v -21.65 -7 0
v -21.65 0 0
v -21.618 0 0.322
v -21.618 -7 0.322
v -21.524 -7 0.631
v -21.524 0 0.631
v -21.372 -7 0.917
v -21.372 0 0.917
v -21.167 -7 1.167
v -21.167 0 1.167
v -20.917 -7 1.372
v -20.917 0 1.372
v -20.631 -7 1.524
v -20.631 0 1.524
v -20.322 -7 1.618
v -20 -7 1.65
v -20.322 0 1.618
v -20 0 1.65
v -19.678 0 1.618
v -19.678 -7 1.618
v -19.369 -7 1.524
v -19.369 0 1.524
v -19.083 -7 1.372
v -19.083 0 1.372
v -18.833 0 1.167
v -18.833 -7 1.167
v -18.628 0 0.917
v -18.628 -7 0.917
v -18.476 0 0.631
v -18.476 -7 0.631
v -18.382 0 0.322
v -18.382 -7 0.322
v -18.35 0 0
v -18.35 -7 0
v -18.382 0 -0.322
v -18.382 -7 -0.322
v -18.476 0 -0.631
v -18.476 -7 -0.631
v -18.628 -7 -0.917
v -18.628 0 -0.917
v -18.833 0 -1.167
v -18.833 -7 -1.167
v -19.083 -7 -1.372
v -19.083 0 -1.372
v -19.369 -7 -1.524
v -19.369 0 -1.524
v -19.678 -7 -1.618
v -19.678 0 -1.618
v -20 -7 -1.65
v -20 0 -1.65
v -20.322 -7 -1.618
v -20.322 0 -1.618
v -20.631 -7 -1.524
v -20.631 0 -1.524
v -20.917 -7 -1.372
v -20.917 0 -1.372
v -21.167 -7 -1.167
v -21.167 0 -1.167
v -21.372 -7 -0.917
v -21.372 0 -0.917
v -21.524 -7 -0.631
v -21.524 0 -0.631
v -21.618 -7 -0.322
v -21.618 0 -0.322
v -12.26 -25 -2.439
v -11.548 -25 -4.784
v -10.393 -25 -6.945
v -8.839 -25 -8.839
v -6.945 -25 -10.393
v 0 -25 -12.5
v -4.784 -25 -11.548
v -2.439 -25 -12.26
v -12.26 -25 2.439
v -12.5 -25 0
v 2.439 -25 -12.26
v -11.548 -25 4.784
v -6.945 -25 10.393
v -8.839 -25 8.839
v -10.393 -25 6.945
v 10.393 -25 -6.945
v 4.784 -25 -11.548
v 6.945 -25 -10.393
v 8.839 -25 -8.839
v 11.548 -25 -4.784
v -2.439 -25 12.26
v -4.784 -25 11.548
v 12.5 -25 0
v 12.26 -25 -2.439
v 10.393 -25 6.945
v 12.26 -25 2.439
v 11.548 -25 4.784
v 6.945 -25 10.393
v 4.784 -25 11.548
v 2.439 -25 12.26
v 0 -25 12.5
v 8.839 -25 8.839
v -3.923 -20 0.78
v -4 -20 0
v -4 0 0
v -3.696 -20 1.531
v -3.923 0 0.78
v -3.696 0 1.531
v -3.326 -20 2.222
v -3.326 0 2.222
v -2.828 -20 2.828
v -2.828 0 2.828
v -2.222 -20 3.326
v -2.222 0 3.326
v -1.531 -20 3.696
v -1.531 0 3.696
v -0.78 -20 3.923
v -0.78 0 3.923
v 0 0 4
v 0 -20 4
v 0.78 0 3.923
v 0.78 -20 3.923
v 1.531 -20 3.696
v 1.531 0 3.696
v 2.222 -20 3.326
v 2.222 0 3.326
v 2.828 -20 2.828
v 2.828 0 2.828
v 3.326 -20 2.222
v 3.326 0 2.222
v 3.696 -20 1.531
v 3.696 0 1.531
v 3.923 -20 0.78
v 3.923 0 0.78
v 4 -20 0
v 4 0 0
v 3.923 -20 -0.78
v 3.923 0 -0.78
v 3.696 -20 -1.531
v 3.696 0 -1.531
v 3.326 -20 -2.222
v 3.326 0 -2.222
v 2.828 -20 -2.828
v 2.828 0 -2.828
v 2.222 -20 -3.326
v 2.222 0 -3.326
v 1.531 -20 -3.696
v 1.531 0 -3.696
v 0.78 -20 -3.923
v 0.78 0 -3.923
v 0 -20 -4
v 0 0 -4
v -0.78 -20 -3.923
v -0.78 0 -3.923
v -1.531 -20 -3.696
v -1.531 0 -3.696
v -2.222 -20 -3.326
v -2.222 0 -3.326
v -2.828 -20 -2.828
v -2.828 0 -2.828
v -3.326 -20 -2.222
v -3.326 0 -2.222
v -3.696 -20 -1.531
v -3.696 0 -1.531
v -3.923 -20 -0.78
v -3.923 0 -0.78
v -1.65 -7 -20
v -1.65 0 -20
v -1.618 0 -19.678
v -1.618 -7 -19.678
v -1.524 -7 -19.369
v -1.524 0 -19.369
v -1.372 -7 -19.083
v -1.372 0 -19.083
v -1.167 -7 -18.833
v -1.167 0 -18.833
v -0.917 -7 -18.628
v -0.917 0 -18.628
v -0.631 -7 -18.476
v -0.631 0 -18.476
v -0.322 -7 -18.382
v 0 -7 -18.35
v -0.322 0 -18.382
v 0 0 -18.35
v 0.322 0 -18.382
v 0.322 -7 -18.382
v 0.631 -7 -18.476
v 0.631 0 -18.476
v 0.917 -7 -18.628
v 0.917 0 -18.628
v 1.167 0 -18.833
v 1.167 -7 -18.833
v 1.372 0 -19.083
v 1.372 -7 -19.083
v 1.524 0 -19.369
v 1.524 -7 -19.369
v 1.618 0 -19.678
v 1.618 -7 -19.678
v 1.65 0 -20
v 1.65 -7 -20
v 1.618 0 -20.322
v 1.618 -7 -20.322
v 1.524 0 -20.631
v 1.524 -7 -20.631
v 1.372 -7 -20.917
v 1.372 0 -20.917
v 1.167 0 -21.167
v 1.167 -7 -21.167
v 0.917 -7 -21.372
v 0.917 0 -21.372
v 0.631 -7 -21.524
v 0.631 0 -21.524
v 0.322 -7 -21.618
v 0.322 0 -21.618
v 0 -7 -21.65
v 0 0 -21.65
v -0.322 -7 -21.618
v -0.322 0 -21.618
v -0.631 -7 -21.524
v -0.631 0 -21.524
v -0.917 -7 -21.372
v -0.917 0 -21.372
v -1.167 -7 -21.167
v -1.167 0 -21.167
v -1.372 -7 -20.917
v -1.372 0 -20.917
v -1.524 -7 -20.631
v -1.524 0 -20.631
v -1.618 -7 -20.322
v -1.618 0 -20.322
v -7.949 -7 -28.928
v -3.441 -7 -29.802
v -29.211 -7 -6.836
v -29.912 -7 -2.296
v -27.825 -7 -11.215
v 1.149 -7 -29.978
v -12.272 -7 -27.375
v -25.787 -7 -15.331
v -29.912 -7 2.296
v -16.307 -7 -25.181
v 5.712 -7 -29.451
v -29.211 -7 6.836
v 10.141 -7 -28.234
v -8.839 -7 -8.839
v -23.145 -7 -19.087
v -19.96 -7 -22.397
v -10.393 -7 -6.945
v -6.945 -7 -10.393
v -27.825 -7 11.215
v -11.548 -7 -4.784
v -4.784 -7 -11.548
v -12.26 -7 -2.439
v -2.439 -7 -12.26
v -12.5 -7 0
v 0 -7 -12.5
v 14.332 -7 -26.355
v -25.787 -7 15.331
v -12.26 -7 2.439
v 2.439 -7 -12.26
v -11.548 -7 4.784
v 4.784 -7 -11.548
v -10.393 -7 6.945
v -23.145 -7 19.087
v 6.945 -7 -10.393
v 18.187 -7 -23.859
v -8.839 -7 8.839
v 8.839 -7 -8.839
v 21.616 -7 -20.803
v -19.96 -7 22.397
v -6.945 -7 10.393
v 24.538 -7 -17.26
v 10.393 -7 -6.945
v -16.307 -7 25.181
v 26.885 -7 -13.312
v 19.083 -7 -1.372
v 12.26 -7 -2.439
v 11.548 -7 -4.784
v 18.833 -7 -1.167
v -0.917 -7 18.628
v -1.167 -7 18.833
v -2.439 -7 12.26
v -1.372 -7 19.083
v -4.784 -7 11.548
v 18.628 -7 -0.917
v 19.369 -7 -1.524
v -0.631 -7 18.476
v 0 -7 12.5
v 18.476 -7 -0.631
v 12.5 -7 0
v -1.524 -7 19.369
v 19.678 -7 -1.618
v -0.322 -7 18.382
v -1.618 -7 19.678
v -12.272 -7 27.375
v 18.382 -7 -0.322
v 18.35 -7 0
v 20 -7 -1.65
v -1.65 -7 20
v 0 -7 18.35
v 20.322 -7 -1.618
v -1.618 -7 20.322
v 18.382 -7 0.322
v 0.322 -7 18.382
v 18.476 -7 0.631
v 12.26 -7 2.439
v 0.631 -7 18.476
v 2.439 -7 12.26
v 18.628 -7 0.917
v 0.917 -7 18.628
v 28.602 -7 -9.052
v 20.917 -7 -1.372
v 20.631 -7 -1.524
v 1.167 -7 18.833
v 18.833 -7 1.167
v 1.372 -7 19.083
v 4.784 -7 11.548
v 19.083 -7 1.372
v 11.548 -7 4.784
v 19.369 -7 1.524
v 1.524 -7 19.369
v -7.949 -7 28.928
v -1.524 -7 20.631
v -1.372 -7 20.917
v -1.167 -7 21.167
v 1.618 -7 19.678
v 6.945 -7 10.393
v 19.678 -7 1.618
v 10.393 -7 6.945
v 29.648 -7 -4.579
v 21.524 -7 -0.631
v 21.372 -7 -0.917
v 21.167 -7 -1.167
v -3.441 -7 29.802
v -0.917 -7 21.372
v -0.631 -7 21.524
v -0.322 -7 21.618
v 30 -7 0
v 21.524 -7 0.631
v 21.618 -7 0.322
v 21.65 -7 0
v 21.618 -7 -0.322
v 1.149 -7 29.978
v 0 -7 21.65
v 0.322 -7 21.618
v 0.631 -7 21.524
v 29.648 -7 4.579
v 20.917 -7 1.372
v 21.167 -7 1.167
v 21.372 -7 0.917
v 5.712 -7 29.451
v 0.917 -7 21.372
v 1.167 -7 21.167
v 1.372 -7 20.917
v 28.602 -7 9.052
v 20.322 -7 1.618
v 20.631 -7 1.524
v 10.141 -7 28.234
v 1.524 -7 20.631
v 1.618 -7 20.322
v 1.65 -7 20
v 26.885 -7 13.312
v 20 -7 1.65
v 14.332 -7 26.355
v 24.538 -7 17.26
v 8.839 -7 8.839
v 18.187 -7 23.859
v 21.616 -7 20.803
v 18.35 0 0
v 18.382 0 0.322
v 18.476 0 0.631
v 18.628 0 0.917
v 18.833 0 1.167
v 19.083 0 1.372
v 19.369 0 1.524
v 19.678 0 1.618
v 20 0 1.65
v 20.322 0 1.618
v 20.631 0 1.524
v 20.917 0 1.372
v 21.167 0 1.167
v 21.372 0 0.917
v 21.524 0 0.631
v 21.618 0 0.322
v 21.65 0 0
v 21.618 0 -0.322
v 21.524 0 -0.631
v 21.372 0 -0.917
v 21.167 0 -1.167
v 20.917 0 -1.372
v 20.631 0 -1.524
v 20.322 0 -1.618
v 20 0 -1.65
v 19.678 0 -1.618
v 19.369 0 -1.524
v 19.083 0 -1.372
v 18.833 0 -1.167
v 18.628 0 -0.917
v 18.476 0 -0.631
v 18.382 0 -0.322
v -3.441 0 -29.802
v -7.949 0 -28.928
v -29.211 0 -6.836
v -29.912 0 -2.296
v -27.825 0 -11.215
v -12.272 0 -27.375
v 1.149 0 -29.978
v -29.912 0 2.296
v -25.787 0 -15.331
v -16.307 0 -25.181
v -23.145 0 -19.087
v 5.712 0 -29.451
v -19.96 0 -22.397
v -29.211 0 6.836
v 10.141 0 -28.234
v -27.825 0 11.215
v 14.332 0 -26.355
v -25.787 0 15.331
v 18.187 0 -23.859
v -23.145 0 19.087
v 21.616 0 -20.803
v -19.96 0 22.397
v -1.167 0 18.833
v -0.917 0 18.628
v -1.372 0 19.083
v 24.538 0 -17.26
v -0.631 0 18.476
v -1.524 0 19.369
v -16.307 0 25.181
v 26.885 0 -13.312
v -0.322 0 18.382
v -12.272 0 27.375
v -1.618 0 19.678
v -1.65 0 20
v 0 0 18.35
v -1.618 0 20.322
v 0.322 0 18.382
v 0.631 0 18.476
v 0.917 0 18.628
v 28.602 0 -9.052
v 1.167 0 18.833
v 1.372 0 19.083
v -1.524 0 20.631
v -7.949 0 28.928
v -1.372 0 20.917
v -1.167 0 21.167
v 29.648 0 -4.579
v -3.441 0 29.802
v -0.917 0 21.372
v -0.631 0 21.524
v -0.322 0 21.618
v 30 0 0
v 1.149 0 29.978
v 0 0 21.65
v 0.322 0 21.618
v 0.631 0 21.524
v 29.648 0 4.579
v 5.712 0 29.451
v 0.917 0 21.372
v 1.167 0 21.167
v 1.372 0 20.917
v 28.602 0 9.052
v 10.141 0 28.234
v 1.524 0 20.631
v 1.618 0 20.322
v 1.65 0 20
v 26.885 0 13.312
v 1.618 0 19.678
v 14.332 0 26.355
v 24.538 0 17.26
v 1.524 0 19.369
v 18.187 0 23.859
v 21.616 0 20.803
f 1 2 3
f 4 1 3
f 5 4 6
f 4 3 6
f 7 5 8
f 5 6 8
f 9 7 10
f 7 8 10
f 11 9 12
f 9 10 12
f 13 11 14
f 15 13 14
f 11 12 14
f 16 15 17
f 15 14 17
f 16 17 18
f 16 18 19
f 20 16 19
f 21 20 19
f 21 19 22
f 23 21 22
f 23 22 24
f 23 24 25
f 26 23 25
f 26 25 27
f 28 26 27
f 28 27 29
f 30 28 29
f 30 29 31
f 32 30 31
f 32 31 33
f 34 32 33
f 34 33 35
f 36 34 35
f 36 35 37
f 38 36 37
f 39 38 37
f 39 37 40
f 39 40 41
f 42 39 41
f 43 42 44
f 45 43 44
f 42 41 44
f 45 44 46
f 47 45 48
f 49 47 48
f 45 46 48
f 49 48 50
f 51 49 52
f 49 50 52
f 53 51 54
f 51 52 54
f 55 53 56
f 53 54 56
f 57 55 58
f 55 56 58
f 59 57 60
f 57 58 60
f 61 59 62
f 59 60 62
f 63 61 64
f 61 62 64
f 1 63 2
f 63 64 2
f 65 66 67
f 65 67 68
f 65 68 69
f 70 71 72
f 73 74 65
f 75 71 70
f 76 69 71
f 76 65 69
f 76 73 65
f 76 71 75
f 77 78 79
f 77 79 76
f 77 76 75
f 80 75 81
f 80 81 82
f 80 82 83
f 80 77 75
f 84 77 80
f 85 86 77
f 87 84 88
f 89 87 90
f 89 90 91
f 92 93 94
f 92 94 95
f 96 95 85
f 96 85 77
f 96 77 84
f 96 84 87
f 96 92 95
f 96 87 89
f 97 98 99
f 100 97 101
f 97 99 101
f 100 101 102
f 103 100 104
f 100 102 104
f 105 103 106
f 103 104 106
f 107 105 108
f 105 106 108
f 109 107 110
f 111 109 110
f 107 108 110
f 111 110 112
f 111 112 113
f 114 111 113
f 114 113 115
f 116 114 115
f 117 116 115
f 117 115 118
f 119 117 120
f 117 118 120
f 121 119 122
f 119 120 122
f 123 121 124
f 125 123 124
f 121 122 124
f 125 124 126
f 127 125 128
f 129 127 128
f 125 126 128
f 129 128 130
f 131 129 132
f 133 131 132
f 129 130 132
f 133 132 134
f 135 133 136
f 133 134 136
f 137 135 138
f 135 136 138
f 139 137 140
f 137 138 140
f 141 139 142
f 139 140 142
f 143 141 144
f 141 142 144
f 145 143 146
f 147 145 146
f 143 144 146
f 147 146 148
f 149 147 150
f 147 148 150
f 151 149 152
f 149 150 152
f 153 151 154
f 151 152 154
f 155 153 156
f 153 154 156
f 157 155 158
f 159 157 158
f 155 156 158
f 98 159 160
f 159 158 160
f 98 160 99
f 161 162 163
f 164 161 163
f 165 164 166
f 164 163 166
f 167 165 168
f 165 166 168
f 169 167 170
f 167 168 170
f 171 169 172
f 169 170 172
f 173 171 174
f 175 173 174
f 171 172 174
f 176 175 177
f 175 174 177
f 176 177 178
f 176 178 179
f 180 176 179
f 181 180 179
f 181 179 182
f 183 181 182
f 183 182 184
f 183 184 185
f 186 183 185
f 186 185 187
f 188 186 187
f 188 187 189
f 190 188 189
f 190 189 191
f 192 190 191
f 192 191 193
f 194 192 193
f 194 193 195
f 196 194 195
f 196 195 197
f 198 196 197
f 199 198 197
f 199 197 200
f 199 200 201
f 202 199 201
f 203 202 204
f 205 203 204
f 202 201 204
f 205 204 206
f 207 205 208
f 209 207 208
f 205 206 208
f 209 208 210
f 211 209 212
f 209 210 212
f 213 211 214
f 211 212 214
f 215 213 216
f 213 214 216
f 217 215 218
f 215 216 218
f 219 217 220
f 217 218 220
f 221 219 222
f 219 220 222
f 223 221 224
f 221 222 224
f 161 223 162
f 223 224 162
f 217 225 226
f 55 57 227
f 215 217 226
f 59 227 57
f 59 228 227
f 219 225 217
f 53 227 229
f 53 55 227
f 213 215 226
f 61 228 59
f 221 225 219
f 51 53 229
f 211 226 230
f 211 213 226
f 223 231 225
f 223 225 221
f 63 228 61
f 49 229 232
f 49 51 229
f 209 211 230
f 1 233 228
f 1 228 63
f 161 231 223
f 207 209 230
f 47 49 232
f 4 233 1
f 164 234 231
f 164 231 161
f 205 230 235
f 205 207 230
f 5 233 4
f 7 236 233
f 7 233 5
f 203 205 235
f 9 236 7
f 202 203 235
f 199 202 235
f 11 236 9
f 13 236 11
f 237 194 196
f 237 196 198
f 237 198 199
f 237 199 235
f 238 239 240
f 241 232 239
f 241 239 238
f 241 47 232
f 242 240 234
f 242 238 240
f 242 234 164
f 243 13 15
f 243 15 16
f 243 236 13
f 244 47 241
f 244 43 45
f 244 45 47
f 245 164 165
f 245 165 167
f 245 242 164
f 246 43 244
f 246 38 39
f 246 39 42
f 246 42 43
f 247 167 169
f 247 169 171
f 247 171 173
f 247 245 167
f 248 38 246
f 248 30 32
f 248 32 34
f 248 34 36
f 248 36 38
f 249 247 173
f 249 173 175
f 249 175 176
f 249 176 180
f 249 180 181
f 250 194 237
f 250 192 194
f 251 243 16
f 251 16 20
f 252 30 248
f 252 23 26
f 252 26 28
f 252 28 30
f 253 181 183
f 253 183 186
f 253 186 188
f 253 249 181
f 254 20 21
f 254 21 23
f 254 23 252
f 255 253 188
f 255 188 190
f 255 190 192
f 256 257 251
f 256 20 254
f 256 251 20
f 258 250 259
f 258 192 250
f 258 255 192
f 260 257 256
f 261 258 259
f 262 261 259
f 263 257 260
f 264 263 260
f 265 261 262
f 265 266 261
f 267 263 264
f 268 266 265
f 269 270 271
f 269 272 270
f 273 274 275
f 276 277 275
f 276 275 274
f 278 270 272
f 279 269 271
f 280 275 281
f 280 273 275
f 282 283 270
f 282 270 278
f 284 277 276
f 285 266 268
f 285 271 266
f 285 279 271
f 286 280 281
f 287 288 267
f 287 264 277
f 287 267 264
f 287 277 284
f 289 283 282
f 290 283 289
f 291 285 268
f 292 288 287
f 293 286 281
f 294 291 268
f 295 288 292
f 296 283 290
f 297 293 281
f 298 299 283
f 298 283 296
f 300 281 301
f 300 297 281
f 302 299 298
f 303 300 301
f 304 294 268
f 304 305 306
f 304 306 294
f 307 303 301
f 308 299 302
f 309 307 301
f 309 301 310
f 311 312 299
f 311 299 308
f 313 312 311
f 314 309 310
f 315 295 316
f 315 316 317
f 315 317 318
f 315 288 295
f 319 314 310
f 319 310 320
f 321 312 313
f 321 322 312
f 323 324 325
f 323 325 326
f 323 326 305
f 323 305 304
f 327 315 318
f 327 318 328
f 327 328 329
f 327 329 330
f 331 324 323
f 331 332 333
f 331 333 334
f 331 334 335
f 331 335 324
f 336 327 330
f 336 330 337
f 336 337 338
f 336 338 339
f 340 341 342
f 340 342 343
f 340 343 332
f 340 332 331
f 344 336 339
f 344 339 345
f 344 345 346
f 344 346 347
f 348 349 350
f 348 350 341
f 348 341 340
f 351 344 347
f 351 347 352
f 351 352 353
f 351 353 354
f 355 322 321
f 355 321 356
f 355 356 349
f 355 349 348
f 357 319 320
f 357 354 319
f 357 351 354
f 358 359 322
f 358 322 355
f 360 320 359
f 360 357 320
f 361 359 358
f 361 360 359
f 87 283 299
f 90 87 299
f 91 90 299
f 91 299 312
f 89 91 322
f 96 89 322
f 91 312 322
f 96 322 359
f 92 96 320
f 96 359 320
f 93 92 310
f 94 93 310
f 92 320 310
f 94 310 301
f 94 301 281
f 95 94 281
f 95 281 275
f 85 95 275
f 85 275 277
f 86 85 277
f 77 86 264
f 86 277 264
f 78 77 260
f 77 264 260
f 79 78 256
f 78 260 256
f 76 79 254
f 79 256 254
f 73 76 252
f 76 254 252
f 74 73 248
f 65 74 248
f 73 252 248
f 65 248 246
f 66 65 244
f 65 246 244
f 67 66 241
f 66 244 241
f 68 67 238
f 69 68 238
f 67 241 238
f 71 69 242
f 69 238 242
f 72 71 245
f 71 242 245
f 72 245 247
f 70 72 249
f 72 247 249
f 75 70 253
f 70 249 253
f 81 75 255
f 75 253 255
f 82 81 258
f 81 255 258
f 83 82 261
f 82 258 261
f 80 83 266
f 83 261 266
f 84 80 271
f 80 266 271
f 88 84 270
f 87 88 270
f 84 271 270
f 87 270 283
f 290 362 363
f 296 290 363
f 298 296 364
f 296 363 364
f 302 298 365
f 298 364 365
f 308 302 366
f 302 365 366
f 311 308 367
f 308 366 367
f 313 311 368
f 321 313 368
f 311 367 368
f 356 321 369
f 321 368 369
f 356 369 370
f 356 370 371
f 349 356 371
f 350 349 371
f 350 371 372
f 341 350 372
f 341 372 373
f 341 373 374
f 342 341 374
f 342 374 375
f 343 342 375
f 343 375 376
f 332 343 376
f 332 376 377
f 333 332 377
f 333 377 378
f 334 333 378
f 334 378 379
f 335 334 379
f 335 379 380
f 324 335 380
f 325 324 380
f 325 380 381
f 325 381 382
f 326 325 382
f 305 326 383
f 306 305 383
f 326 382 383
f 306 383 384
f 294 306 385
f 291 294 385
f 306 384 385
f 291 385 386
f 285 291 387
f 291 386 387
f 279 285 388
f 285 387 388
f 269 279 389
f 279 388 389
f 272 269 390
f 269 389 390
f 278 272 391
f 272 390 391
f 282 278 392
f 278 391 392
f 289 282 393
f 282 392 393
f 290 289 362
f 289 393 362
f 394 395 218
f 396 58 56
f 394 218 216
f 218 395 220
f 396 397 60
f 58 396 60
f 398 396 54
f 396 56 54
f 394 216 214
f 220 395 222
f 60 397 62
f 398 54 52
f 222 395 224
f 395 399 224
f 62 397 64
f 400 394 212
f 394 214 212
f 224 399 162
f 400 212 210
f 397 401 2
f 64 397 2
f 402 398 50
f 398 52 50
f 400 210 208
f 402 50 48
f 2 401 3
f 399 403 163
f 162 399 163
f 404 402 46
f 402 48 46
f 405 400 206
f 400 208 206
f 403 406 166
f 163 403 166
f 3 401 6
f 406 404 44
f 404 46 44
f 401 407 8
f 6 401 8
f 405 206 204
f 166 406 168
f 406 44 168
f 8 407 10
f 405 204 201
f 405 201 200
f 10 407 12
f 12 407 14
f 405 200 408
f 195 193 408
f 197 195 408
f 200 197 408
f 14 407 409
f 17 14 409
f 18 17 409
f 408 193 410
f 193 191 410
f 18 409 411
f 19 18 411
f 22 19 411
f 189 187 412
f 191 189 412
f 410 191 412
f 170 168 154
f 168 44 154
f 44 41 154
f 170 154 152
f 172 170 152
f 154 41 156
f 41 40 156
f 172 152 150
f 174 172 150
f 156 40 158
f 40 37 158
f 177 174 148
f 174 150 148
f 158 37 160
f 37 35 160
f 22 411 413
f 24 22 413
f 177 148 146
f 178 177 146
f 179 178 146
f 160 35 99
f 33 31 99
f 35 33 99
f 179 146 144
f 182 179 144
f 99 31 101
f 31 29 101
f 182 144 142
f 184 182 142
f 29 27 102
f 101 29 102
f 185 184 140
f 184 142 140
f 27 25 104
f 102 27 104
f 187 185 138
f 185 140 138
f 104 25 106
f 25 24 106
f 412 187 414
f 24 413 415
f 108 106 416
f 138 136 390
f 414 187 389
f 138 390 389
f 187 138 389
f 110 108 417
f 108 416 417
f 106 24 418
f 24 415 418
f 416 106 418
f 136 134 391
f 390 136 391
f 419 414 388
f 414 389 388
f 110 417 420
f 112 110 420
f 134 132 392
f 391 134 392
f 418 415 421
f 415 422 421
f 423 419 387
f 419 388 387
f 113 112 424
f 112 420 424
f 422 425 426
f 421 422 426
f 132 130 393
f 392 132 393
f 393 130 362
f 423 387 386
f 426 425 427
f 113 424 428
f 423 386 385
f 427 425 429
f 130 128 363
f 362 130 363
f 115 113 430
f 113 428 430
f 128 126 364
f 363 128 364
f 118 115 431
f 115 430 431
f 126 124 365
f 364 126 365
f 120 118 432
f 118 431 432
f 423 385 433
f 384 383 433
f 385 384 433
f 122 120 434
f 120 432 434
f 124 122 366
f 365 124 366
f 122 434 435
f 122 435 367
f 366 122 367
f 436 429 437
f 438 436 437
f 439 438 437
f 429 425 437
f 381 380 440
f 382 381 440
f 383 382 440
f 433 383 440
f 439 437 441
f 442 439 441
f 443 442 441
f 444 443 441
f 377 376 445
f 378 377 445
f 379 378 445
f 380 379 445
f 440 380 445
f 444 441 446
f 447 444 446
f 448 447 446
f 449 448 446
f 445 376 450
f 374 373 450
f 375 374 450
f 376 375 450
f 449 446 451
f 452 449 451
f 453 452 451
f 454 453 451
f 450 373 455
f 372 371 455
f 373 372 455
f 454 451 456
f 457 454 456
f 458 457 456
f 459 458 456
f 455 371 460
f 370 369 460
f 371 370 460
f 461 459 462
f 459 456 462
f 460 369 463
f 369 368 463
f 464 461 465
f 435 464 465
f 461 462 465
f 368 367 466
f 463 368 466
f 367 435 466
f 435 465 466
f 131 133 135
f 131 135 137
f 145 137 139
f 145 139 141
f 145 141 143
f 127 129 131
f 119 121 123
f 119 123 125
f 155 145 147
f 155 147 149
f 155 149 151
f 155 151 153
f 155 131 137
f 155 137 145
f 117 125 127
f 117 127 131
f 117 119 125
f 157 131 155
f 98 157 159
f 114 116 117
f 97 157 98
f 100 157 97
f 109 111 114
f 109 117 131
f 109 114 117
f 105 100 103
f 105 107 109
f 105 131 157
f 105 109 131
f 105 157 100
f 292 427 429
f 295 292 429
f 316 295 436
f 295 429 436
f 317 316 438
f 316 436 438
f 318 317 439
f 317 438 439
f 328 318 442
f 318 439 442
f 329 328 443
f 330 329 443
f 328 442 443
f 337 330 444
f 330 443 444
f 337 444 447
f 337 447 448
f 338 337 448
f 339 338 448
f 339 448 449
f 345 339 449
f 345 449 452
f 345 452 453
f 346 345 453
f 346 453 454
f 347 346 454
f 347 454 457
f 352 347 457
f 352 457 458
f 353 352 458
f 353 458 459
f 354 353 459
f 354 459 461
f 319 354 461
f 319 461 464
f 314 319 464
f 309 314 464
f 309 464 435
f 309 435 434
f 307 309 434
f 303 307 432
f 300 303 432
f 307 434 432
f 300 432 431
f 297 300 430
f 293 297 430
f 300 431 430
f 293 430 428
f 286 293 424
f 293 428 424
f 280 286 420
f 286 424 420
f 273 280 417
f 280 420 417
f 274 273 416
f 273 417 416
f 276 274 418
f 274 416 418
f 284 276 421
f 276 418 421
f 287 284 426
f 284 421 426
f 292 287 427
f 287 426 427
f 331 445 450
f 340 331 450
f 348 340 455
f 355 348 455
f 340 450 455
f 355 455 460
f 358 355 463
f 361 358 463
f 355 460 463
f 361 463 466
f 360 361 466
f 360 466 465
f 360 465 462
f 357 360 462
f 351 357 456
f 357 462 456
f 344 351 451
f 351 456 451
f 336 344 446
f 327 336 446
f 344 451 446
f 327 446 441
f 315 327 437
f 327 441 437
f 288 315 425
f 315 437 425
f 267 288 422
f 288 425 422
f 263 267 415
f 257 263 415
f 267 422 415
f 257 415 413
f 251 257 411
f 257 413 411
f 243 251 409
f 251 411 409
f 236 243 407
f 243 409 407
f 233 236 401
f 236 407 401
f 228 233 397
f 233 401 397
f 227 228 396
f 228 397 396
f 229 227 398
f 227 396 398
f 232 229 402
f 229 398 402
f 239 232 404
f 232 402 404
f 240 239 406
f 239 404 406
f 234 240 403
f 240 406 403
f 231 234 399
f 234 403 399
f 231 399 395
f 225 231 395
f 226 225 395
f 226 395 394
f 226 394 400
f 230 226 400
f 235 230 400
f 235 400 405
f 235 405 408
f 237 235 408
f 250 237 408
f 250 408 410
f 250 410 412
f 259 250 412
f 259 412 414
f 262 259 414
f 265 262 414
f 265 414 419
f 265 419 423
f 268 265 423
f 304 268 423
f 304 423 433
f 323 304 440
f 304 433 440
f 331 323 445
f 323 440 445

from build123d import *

# Parameters (mm, degrees)
F0_R     = 30
F1_DEPTH = 7
F3_D     = 3.3
F4_R     = 12.5
F5_DEPTH = 18
F6_R     = 4
F7_DEPTH = 20
F8_R     = 42.262069542
F9_DEPTH = 25


with BuildPart() as f1:
    # F0 (on Front) → F1 (new body)
    with BuildSketch(Plane.XZ):
        Circle(F0_R)
    extrude(amount=F1_DEPTH)

    # F3 (through all)
    with Locations(Plane.XZ.offset(7)):
        with Locations((0, 20), (20, 0), (0, -20), (-20, 0)):
            Hole(F3_D / 2)

    # F4 (on face) → F5 (join)
    with BuildSketch(Plane.XZ.offset(7)):
        Circle(F4_R)
    extrude(amount=F5_DEPTH)

    # F6 (on face) → F7 (cut)
    with BuildSketch(Plane(origin=(0, 0, 0), x_dir=(-1, 0, 0), z_dir=(0, 1, 0))):
        Circle(F6_R)
    extrude(amount=-F7_DEPTH, mode=Mode.SUBTRACT)


with BuildPart() as f9:
    # F8 (on Front) → F9 (new body)
    with BuildSketch(Plane.XZ):
        Circle(F8_R)
    extrude(amount=F9_DEPTH)


solid = f1.part
